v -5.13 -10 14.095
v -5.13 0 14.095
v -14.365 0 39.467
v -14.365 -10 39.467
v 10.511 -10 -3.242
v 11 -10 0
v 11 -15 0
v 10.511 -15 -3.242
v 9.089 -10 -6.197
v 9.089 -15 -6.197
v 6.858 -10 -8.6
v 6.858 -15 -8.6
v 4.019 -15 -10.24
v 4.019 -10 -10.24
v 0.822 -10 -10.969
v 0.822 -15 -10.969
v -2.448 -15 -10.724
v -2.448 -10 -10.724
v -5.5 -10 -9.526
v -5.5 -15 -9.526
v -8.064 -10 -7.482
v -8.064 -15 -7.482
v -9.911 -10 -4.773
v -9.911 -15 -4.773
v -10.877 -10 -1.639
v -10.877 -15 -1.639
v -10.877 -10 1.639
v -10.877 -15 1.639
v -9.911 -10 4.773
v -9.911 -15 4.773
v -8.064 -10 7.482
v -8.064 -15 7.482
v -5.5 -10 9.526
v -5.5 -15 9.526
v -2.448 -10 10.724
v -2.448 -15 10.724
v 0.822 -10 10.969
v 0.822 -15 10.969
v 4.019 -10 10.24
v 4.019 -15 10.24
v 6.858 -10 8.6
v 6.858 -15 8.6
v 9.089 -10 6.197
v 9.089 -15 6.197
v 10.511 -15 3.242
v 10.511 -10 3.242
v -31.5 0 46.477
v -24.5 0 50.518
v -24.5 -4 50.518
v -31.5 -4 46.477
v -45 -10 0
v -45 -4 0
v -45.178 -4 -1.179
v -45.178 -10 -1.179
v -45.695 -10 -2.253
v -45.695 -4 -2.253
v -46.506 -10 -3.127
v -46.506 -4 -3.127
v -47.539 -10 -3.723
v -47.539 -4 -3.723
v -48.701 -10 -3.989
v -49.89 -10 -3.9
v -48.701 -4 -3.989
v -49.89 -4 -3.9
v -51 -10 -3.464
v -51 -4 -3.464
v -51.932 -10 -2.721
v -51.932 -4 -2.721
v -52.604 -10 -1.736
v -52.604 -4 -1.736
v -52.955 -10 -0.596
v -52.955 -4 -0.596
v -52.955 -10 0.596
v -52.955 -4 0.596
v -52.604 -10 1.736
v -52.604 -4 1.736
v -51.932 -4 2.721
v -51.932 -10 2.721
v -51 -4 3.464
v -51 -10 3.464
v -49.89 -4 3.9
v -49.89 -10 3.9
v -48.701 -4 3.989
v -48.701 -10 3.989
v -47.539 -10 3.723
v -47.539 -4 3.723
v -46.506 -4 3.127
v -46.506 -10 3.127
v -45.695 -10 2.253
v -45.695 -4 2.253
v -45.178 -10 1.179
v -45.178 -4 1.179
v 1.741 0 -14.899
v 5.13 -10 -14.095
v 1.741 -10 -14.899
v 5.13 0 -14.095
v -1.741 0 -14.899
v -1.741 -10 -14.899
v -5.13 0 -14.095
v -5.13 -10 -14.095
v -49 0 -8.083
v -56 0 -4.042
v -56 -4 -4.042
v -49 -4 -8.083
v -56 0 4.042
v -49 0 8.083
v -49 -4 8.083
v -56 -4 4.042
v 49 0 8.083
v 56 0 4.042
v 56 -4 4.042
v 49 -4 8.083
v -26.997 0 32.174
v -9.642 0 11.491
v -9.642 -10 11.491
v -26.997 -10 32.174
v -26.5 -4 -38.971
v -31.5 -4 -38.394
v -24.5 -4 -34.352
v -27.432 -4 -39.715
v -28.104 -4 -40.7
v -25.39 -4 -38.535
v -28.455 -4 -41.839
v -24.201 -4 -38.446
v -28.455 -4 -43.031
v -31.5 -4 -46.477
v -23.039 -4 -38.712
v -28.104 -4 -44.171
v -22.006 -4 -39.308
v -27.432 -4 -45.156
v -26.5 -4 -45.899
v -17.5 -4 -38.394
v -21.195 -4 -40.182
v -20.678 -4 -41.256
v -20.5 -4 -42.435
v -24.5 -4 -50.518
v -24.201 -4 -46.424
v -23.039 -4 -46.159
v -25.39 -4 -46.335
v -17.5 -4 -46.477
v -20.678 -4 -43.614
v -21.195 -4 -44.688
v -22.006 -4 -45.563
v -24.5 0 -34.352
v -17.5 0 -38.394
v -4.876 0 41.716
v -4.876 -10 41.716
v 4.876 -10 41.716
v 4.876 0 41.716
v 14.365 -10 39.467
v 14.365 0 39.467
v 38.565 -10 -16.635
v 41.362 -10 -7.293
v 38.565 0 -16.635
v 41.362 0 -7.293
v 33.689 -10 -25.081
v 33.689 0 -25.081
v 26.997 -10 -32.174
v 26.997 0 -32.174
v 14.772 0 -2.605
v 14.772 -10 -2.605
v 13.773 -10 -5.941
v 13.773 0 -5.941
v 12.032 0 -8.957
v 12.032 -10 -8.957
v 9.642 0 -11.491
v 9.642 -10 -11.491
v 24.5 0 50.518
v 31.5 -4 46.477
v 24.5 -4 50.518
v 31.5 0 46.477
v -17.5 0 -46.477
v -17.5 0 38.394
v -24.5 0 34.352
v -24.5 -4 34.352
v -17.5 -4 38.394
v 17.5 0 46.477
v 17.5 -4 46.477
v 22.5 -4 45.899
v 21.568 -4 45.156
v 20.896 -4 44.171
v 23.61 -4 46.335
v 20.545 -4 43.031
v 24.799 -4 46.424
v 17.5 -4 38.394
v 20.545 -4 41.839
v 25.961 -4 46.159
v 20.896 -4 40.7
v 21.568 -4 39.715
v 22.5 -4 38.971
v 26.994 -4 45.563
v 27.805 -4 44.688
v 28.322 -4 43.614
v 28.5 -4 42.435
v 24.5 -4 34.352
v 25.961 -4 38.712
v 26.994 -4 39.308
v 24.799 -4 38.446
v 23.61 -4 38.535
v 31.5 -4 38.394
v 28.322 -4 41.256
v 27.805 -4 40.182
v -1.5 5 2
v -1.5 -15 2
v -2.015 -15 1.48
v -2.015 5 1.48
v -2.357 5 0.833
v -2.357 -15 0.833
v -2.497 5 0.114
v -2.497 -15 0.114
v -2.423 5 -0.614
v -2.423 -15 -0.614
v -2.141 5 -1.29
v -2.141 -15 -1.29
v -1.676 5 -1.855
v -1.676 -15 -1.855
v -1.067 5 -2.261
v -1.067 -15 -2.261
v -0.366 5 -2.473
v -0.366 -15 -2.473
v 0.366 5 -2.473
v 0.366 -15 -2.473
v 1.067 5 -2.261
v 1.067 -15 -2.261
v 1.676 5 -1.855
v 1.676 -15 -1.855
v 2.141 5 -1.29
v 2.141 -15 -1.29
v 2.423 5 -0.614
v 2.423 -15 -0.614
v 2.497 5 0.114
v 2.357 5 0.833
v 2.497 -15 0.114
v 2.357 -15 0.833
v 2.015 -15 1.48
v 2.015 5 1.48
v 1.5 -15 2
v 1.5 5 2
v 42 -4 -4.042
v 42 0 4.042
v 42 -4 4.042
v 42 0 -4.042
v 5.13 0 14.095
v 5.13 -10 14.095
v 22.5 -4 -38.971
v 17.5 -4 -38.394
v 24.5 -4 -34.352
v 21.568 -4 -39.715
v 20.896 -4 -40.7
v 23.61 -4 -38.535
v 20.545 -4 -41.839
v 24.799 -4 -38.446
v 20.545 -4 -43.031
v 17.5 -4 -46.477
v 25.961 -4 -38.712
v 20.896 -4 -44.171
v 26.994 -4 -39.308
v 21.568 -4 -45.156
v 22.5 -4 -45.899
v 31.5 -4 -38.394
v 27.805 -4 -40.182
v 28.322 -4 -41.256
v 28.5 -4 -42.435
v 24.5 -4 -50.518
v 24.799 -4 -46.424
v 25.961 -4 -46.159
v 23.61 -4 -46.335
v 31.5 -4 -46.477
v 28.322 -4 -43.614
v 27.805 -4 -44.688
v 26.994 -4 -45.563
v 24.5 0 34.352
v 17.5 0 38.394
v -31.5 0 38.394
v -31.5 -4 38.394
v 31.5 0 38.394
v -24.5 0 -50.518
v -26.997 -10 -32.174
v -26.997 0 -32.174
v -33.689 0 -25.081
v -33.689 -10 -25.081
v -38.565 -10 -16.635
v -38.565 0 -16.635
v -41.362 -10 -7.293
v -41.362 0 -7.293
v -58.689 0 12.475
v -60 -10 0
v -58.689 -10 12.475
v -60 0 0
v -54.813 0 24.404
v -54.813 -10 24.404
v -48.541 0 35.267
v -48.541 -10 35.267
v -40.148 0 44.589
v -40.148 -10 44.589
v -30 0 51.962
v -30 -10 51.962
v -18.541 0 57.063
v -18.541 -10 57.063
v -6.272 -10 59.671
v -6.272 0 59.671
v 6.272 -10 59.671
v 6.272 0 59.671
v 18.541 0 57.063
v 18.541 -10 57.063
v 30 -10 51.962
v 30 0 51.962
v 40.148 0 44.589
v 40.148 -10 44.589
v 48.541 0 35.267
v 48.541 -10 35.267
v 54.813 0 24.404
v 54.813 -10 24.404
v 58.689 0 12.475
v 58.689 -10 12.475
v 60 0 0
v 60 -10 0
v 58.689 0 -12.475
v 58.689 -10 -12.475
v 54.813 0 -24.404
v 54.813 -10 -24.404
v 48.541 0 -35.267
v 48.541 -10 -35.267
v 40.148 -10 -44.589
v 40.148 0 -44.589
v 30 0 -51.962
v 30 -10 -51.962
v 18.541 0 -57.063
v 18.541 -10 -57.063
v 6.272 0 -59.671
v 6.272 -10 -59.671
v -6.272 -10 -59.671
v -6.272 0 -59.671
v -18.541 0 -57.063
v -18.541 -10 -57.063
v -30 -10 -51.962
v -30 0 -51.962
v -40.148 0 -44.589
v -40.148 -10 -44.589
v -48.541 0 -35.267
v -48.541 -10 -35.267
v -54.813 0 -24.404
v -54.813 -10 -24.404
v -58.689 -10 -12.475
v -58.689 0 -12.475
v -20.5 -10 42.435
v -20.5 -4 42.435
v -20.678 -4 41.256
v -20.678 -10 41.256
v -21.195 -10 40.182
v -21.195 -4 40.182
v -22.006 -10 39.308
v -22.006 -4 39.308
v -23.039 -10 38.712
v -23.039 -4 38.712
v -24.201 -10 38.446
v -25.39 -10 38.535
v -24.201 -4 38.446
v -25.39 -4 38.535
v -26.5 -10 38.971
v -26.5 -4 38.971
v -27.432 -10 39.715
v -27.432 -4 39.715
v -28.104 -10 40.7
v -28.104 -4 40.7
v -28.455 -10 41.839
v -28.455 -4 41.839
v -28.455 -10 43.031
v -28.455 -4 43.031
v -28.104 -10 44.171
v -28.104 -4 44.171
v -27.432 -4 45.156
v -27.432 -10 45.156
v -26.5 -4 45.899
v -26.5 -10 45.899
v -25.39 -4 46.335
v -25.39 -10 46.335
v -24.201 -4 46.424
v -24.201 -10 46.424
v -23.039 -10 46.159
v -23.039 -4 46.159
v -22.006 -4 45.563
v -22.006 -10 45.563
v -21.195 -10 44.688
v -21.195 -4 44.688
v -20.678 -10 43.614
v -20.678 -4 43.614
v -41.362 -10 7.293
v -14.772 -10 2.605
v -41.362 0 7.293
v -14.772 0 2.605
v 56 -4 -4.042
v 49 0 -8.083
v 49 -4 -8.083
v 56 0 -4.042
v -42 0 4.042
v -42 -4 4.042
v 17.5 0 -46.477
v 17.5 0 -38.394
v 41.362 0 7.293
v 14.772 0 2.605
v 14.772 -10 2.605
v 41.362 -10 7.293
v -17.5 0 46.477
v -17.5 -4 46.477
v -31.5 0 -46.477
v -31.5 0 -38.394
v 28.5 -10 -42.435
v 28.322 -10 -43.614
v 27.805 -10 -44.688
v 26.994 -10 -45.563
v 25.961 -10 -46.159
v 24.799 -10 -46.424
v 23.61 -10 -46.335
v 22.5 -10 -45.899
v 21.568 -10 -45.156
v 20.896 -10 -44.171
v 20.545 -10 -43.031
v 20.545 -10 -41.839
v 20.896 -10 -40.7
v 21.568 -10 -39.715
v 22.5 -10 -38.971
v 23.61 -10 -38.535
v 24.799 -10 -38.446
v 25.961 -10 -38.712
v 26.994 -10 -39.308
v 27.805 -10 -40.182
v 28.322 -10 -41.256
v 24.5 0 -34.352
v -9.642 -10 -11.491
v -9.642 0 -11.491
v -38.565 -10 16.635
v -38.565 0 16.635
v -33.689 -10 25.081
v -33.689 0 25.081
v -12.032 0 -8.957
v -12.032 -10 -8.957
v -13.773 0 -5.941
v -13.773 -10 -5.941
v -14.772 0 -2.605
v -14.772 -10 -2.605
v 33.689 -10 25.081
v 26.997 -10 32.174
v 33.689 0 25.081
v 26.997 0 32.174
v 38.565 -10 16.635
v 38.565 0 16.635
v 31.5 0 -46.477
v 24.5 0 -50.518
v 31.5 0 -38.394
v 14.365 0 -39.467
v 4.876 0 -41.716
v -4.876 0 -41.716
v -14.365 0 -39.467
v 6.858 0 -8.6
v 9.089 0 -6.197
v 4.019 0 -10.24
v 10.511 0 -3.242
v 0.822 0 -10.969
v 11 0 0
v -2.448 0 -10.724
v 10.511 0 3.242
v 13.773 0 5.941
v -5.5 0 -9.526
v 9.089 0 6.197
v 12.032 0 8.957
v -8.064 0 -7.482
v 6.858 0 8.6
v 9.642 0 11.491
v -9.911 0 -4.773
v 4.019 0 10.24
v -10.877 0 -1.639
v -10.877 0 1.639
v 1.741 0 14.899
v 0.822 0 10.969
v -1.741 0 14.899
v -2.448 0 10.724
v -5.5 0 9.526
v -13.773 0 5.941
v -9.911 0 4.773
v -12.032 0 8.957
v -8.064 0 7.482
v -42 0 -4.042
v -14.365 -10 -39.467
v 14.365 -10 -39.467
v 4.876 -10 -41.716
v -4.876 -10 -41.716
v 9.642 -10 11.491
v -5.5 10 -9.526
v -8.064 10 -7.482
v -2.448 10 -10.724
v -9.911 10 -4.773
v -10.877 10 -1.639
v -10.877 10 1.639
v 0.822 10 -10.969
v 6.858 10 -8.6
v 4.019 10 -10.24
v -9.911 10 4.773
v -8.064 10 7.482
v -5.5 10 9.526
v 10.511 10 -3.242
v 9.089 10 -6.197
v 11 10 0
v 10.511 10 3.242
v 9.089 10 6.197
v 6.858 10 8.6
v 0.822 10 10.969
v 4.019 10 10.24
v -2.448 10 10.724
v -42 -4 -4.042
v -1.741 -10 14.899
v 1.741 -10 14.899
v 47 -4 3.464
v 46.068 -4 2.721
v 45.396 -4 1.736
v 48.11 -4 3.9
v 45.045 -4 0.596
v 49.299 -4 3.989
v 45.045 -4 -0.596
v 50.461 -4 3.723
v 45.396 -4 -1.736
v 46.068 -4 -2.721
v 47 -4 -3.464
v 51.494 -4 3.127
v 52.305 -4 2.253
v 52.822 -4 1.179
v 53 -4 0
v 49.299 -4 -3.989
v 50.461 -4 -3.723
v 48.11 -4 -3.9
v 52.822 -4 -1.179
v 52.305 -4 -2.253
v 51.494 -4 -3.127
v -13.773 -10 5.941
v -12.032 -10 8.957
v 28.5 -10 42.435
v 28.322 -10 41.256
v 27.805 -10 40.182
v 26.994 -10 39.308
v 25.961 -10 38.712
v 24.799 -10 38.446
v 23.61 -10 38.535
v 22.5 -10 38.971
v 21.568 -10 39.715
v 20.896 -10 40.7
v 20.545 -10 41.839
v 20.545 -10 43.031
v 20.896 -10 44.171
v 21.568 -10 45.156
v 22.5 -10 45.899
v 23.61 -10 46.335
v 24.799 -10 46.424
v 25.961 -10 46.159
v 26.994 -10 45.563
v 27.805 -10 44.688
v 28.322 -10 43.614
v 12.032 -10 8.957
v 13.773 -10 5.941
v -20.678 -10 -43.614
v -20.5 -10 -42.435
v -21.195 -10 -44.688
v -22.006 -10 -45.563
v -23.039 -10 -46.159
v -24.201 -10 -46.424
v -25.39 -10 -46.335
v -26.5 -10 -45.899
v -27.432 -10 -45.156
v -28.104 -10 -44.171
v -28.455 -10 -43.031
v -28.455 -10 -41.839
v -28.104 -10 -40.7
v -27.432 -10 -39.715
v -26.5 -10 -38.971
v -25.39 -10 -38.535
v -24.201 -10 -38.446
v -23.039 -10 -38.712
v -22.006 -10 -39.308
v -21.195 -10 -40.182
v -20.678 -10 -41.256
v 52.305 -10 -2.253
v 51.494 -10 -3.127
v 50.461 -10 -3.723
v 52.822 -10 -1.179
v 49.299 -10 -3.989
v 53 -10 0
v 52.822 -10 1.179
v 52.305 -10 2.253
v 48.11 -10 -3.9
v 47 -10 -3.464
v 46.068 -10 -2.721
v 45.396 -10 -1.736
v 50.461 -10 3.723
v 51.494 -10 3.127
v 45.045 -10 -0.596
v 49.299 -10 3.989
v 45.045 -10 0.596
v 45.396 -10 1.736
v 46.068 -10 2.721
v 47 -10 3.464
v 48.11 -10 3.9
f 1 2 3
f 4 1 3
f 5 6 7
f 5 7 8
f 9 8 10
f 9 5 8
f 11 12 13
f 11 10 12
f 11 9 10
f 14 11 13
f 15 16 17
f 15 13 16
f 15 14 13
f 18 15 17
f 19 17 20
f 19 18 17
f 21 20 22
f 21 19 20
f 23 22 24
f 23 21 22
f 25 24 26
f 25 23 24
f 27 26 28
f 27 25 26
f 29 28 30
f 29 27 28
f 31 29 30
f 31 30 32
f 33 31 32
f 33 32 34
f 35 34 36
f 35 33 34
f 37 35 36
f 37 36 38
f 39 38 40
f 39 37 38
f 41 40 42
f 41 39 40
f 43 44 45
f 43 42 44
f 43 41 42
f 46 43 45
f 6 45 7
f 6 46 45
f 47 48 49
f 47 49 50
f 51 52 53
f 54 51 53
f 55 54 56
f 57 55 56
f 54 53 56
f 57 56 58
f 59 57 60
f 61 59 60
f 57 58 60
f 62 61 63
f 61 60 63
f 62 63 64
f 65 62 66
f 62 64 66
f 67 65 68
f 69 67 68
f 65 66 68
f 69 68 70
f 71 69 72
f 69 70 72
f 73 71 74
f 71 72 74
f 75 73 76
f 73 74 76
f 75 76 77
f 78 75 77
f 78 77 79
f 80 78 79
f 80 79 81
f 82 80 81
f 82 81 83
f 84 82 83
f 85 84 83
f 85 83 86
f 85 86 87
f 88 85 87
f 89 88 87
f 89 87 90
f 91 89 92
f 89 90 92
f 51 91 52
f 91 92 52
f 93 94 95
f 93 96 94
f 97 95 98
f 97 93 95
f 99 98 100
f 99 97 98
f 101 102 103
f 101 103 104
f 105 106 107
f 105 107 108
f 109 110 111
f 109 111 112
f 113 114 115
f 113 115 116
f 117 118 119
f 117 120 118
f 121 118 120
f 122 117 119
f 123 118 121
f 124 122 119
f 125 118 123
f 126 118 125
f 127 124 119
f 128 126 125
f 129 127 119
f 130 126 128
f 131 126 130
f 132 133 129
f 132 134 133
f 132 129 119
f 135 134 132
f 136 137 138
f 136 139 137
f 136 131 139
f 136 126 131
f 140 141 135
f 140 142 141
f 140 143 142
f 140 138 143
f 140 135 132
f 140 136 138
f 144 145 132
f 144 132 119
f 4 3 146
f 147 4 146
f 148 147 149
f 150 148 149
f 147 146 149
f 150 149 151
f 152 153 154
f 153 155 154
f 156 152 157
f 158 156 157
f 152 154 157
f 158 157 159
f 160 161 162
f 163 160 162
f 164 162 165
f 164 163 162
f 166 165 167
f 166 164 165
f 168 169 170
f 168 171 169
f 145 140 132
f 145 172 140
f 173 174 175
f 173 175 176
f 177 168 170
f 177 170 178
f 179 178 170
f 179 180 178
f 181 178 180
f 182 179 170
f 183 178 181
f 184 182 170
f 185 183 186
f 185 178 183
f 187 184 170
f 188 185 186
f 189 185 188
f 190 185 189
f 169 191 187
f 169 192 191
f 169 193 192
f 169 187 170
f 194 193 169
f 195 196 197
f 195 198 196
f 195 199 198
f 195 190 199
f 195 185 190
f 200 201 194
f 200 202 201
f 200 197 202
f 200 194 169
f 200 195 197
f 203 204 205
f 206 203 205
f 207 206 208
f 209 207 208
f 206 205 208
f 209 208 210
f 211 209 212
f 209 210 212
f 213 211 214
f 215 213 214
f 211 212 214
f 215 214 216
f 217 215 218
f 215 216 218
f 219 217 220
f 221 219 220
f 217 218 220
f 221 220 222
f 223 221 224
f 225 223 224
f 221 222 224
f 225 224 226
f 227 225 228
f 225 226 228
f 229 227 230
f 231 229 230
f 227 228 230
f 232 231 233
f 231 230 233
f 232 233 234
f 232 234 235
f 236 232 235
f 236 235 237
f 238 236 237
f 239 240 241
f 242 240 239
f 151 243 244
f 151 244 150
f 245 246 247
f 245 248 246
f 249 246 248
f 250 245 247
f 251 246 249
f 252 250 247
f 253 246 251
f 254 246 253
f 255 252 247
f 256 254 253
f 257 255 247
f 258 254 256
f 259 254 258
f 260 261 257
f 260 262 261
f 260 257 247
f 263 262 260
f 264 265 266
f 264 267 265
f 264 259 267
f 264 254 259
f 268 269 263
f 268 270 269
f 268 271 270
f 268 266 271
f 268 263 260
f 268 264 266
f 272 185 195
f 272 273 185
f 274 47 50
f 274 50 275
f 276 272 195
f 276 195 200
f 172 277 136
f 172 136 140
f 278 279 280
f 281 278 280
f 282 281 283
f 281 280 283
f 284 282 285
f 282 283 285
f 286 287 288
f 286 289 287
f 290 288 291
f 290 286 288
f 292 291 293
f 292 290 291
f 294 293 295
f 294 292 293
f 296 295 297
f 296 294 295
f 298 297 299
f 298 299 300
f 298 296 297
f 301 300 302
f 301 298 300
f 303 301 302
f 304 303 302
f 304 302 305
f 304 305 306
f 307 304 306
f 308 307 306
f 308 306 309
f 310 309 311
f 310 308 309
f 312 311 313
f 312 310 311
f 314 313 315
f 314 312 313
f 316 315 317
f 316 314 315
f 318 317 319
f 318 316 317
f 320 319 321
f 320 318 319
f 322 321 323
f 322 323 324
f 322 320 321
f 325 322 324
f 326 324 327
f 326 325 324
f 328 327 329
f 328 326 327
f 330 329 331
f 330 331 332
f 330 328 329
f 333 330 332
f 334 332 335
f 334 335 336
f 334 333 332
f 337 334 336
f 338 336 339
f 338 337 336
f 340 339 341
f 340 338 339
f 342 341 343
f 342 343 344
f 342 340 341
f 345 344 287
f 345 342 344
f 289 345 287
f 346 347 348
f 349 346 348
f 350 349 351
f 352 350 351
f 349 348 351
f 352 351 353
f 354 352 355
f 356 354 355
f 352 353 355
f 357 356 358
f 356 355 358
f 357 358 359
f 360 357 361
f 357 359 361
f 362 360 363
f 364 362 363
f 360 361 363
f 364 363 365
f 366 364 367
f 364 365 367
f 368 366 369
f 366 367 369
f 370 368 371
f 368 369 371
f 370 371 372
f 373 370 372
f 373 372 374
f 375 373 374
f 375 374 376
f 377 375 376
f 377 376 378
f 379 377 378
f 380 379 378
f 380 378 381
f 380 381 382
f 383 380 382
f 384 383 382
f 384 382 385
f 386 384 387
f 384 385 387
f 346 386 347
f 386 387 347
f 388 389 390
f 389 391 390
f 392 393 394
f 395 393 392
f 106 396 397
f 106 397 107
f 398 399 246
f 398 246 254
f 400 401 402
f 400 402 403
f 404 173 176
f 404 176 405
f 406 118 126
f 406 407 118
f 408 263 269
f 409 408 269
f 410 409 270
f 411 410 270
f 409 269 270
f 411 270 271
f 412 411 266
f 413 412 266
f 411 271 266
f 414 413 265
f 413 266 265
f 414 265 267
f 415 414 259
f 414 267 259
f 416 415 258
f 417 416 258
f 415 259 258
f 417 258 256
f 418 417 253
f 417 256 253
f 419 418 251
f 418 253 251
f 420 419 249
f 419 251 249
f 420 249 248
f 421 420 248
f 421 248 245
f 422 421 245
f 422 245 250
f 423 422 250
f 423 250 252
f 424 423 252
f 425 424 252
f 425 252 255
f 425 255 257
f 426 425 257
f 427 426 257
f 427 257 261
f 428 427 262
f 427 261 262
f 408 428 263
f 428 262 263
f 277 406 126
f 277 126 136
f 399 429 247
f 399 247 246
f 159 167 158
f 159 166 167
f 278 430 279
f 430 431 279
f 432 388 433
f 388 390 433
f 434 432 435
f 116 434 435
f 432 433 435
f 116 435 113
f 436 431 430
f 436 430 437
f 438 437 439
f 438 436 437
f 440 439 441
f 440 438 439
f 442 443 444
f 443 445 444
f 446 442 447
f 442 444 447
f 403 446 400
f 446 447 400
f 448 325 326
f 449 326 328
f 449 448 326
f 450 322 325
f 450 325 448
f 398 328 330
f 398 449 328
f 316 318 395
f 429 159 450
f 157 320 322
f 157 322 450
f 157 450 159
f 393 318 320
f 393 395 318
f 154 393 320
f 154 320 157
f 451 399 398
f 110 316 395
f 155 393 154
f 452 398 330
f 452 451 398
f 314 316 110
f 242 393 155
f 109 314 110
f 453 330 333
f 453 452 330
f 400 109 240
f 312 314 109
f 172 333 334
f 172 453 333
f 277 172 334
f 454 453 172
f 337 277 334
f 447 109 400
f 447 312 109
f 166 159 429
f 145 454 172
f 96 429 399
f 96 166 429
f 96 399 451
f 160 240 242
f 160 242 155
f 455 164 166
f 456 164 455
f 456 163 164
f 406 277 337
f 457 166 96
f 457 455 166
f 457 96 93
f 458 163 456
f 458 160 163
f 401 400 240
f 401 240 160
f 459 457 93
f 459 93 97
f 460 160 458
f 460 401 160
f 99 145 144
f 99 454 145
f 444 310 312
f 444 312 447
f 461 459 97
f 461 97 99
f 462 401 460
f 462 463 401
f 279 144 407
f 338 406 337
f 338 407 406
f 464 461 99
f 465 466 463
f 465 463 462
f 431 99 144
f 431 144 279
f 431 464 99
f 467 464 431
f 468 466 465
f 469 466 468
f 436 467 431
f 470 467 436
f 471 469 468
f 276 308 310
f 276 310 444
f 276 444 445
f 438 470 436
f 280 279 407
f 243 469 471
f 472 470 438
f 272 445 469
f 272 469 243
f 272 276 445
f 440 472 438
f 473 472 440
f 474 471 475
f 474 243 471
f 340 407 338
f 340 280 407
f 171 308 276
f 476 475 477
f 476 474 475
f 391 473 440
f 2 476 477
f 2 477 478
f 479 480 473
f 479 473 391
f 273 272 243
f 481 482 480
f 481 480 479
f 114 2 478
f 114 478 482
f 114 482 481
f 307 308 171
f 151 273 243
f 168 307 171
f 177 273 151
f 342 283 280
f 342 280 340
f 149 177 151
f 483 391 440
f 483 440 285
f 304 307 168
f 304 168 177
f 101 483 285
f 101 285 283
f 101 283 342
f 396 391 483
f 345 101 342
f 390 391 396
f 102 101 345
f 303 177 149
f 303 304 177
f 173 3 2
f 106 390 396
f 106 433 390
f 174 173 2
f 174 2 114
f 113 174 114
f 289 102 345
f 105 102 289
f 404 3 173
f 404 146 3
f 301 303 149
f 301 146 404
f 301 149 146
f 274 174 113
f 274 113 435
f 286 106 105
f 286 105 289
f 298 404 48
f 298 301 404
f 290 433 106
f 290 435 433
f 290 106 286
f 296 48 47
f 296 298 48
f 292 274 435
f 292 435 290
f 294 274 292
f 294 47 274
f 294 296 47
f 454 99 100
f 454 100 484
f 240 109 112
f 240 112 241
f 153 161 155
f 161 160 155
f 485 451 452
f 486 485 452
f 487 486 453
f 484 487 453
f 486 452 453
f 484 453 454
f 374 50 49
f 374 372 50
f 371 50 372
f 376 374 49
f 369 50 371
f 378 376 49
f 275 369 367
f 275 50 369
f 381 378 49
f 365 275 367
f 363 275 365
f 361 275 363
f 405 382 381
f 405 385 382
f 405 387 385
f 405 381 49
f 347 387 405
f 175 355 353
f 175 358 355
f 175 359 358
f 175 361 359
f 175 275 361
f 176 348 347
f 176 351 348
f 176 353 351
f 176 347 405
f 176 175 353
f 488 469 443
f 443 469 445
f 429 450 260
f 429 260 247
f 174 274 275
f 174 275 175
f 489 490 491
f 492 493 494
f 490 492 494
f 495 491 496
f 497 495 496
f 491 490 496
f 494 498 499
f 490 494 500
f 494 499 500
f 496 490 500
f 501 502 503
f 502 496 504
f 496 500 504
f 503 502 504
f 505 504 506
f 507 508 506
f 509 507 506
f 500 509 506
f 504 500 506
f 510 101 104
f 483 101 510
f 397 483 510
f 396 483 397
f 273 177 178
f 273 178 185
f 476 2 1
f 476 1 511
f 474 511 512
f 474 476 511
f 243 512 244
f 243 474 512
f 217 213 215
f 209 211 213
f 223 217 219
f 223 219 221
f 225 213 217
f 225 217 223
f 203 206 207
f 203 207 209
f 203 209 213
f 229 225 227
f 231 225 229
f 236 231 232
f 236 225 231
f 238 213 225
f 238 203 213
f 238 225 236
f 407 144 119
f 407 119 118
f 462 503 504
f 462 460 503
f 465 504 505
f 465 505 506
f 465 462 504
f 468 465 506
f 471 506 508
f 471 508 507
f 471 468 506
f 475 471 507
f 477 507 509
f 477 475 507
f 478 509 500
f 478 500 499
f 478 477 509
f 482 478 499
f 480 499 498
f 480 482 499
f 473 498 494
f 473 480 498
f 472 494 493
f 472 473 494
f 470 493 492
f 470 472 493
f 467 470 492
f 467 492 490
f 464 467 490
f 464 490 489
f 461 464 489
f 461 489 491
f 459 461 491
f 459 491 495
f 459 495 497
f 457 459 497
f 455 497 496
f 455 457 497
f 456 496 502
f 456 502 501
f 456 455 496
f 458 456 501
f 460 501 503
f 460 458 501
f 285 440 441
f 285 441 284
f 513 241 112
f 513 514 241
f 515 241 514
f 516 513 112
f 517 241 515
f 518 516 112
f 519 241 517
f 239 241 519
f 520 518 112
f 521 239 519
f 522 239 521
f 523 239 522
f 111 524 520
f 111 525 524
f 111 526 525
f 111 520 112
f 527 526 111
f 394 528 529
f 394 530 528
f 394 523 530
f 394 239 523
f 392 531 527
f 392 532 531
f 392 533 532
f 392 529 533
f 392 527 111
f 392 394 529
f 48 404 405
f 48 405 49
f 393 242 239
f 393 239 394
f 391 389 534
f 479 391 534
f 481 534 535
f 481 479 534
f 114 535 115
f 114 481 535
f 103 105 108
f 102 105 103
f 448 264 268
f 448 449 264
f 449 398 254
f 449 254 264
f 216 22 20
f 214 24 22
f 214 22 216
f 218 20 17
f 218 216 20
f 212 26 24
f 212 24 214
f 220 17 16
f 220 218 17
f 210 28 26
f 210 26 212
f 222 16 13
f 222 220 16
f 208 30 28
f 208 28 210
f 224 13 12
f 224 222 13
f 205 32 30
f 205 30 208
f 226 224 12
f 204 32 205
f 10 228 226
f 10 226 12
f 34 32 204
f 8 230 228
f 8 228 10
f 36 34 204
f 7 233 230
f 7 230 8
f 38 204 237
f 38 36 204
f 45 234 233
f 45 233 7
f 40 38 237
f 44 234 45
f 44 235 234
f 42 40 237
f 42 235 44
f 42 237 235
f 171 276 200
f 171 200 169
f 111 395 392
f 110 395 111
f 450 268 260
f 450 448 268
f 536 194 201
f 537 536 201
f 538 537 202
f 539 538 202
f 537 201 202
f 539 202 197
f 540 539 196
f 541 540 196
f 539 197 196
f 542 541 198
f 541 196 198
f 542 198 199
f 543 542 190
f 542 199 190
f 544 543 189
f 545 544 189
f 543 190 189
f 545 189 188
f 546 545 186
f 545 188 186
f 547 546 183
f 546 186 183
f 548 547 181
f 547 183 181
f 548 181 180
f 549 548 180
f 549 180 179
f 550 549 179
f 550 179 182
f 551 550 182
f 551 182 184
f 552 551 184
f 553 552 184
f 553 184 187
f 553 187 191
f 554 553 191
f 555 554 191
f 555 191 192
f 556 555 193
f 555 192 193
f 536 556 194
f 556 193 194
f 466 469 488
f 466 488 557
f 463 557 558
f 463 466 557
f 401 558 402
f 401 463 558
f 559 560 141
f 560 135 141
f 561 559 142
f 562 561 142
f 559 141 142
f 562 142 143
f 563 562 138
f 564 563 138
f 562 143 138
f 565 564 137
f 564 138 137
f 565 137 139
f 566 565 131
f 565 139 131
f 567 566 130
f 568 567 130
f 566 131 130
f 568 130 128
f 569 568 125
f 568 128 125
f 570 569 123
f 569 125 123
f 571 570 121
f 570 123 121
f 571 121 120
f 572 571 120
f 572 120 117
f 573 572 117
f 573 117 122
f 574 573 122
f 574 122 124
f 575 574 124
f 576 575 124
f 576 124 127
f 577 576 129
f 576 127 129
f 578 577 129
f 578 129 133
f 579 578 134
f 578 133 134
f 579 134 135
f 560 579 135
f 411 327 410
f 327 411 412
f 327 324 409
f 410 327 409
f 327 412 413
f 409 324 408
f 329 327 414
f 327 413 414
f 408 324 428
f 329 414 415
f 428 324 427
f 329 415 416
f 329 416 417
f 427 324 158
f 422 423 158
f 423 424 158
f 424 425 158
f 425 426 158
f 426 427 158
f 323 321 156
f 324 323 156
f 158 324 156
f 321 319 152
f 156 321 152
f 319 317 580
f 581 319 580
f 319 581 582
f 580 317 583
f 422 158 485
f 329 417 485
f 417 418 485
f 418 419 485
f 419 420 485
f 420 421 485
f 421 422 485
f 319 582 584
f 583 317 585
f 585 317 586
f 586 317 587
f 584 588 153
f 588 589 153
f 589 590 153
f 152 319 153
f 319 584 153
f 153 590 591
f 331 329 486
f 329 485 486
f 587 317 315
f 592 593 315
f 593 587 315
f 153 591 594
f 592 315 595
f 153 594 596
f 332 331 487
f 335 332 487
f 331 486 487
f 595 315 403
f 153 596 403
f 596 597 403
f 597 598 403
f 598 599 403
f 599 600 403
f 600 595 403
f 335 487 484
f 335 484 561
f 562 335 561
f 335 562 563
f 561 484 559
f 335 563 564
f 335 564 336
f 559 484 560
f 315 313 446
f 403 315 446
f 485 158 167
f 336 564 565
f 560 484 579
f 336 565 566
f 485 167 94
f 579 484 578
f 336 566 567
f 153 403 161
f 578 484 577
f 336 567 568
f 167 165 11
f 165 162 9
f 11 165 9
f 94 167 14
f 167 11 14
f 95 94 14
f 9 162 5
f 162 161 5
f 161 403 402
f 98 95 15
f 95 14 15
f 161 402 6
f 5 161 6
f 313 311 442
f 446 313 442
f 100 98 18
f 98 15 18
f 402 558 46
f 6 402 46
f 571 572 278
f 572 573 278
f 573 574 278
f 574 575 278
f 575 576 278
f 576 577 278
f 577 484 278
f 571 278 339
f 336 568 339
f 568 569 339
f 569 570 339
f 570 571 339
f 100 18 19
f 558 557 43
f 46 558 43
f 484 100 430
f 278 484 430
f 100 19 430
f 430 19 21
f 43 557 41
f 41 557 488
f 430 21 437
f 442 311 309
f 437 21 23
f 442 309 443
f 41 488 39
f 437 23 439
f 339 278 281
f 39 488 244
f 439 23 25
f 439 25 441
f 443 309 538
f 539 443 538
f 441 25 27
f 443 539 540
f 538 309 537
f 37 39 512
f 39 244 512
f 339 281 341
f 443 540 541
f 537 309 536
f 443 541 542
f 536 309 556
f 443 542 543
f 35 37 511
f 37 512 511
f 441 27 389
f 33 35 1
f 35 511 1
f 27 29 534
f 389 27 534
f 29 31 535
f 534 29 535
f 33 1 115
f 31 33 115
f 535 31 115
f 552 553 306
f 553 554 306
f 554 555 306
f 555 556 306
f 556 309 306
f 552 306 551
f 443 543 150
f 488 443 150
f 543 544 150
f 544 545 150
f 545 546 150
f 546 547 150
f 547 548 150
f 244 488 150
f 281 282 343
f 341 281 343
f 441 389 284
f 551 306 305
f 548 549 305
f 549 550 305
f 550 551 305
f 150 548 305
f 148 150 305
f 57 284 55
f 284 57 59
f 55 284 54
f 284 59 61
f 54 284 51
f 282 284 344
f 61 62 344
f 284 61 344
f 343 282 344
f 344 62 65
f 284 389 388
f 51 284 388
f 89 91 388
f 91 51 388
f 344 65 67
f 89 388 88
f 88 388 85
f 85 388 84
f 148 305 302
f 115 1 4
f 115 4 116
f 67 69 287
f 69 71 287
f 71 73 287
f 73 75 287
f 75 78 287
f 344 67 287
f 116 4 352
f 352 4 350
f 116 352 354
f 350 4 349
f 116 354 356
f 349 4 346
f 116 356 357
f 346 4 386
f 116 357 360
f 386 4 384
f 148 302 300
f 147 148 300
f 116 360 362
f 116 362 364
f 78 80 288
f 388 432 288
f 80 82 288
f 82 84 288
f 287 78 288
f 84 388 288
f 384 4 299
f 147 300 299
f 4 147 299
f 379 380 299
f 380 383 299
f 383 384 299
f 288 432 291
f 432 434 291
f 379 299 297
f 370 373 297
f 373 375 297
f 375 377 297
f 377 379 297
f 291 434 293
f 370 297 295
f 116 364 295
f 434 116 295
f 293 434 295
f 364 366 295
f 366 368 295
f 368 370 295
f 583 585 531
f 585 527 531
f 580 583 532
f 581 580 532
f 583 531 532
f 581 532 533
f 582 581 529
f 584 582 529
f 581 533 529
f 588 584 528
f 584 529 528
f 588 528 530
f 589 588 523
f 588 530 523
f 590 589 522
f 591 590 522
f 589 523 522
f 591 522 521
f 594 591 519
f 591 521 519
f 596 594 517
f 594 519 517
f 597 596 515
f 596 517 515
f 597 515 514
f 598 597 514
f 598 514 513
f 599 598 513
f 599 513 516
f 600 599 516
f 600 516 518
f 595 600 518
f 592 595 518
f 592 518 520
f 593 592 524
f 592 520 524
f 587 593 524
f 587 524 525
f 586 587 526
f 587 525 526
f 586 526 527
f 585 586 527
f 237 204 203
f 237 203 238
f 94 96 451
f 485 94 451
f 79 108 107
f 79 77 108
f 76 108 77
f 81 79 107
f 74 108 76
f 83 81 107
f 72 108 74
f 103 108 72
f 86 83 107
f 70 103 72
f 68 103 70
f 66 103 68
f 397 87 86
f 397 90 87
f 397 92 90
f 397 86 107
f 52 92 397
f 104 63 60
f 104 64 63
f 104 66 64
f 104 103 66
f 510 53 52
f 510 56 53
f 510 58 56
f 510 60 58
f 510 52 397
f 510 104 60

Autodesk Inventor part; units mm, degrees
ref_plane "YZ Plane" through (0, 0, 0) normal (1, 0, 0) x (0, 1, 0)
ref_plane "XZ Plane" through (0, 0, 0) normal (0, 1, 0) x (-1, 0, 0)
ref_plane "XY Plane" through (0, 0, 0) normal (0, 0, 1) x (1, 0, 0)
sketch "Sketch1" plane through (0, 0, 0) normal (0, 1, 0) x (-1, 0, 0)
  circle A0 centre (0, 0) radius 60
  line L0 (14.7721, 2.6047) -> (41.3619, 7.2932)
  line L1 (14.7721, -2.6047) -> (41.3619, -7.2932)
  line L2 (0, 0) -> (115.9423, 0) construction
  line L3 (0, 0) -> (87.3255, -15.3978) construction
  line L4 (5.1303, 14.0954) -> (14.3648, 39.4671)
  line L5 (9.6418, 11.4907) -> (26.9971, 32.1739)
  line L6 (-9.6418, 11.4907) -> (-26.9971, 32.1739)
  line L7 (-5.1303, 14.0954) -> (-14.3648, 39.4671)
  line L8 (-14.7721, -2.6047) -> (-41.3619, -7.2932)
  line L9 (-14.7721, 2.6047) -> (-41.3619, 7.2932)
  line L10 (-5.1303, -14.0954) -> (-14.3648, -39.4671)
  line L11 (-9.6418, -11.4907) -> (-26.9971, -32.1739)
  line L12 (9.6418, -11.4907) -> (26.9971, -32.1739)
  line L13 (5.1303, -14.0954) -> (14.3648, -39.4671)
  arc A1 (41.3619, 7.2932) -> (26.9971, 32.1739) centre (0, 0) ccw
  arc A2 (26.9971, -32.1739) -> (41.3619, -7.2932) centre (0, 0) ccw
  arc A3 (-14.3648, -39.4671) -> (14.3648, -39.4671) centre (0, 0) ccw
  arc A4 (-41.3619, -7.2932) -> (-26.9971, -32.1739) centre (0, 0) ccw
  arc A5 (14.3648, 39.4671) -> (-14.3648, 39.4671) centre (0, 0) ccw
  arc A6 (-26.9971, 32.1739) -> (-41.3619, 7.2932) centre (0, 0) ccw
  circle A7 centre (0, 0) radius 42 construction
  circle A8 centre (0, 0) radius 15 construction
  arc A9 (9.6418, -11.4907) -> (14.7721, -2.6047) centre (0, 0) ccw
  arc A10 (-5.1303, -14.0954) -> (5.1303, -14.0954) centre (0, 0) ccw
  arc A11 (-14.7721, -2.6047) -> (-9.6418, -11.4907) centre (0, 0) ccw
  arc A12 (-9.6418, 11.4907) -> (-14.7721, 2.6047) centre (0, 0) ccw
  arc A13 (14.7721, 2.6047) -> (9.6418, 11.4907) centre (0, 0) ccw
  arc A14 (5.1303, 14.0954) -> (-5.1303, 14.0954) centre (0, 0) ccw
  dimension "d12" = 30
  dimension "d13" = 84
  dimension "d0" = 120
  dimension "d3" = 20
  dimension "d4" = 10
  dimension "d10" = 360
extrude "Extrusion1" add sketch "Sketch1" against normal blind 10
sketch "Sketch2" plane through (0, 0, 0) normal (0, 1, 0) x (1, 0, 0)
  circle A0 centre (-49, 0) radius 4
  line L0 (0, 0) -> (-95.2262, 0) construction
  line L1 (-49, 8.0829) -> (-42, 4.0415)
  line L2 (-42, 4.0415) -> (-42, -4.0415)
  line L3 (-42, -4.0415) -> (-49, -8.0829)
  line L4 (-49, -8.0829) -> (-56, -4.0415)
  line L5 (-56, -4.0415) -> (-56, 4.0415)
  line L6 (-56, 4.0415) -> (-49, 8.0829)
  line L7 (0, 0) -> (0, 100.6491) construction
  circle A1 centre (-24.5, -42.4352) radius 4
  line L8 (-31.5, -38.3938) -> (-24.5, -34.3523)
  line L9 (-24.5, -34.3523) -> (-17.5, -38.3938)
  line L10 (-17.5, -38.3938) -> (-17.5, -46.4767)
  line L11 (-17.5, -46.4767) -> (-24.5, -50.5181)
  line L12 (-24.5, -50.5181) -> (-31.5, -46.4767)
  line L13 (-31.5, -46.4767) -> (-31.5, -38.3938)
  circle A2 centre (24.5, -42.4352) radius 4
  line L14 (17.5, -46.4767) -> (17.5, -38.3938)
  line L15 (17.5, -38.3938) -> (24.5, -34.3523)
  line L16 (24.5, -34.3523) -> (31.5, -38.3938)
  line L17 (31.5, -38.3938) -> (31.5, -46.4767)
  line L18 (31.5, -46.4767) -> (24.5, -50.5181)
  line L19 (24.5, -50.5181) -> (17.5, -46.4767)
  circle A3 centre (49, 0) radius 4
  line L20 (49, -8.0829) -> (42, -4.0415)
  line L21 (42, -4.0415) -> (42, 4.0415)
  line L22 (42, 4.0415) -> (49, 8.0829)
  line L23 (49, 8.0829) -> (56, 4.0415)
  line L24 (56, 4.0415) -> (56, -4.0415)
  line L25 (56, -4.0415) -> (49, -8.0829)
  circle A4 centre (24.5, 42.4352) radius 4
  line L26 (31.5, 38.3938) -> (24.5, 34.3523)
  line L27 (24.5, 34.3523) -> (17.5, 38.3938)
  line L28 (17.5, 38.3938) -> (17.5, 46.4767)
  line L29 (17.5, 46.4767) -> (24.5, 50.5181)
  line L30 (24.5, 50.5181) -> (31.5, 46.4767)
  line L31 (31.5, 46.4767) -> (31.5, 38.3938)
  circle A5 centre (-24.5, 42.4352) radius 4
  line L32 (-17.5, 46.4767) -> (-17.5, 38.3938)
  line L33 (-17.5, 38.3938) -> (-24.5, 34.3523)
  line L34 (-24.5, 34.3523) -> (-31.5, 38.3938)
  line L35 (-31.5, 38.3938) -> (-31.5, 46.4767)
  line L36 (-31.5, 46.4767) -> (-24.5, 50.5181)
  line L37 (-24.5, 50.5181) -> (-17.5, 46.4767)
  dimension "d16" = 8
  dimension "d17" = 49
  dimension "d18" = 14
  dimension "d21" = 360
extrude "Extrusion2" cut sketch "Sketch2" against normal blind 4 contours A0 | L1 L2 L3 L4 L5 L6 | A1 | L8 L9 L10 L11 L12 L13 | A2 | L14 L15 L16 L17 L18 L19 | A3 | L20 L21 L22 L23 L24 L25 | A4 | L26 L27 L28 L29 L30 L31 | A5 | L32 L33 L34 L35 L36 L37
extrude "Extrusion3" cut sketch "Sketch2" against normal through all contours A0 | A1 | A2 | A3 | A4 | A5
sketch "Sketch3" plane through (0, -10, 0) normal (0, -1, 0) x (1, 0, 0)
  circle A0 centre (0, 0) radius 11
  dimension "d27" = 22
extrude "Extrusion4" add sketch "Sketch3" along normal blind 5 and the other way blind 20
sketch "Sketch4" plane through (0, -15, 0) normal (0, -1, 0) x (1, 0, 0)
  arc A0 (-1.5, 2) -> (1.5, 2) centre (0, 0) ccw
  line L0 (-1.5, 2) -> (1.5, 2)
  dimension "d30" = 5
  dimension "d31" = 2
extrude "Extrusion5" cut sketch "Sketch4" against normal blind 20
properties part number "Reaction_wheel_3DPrint"
